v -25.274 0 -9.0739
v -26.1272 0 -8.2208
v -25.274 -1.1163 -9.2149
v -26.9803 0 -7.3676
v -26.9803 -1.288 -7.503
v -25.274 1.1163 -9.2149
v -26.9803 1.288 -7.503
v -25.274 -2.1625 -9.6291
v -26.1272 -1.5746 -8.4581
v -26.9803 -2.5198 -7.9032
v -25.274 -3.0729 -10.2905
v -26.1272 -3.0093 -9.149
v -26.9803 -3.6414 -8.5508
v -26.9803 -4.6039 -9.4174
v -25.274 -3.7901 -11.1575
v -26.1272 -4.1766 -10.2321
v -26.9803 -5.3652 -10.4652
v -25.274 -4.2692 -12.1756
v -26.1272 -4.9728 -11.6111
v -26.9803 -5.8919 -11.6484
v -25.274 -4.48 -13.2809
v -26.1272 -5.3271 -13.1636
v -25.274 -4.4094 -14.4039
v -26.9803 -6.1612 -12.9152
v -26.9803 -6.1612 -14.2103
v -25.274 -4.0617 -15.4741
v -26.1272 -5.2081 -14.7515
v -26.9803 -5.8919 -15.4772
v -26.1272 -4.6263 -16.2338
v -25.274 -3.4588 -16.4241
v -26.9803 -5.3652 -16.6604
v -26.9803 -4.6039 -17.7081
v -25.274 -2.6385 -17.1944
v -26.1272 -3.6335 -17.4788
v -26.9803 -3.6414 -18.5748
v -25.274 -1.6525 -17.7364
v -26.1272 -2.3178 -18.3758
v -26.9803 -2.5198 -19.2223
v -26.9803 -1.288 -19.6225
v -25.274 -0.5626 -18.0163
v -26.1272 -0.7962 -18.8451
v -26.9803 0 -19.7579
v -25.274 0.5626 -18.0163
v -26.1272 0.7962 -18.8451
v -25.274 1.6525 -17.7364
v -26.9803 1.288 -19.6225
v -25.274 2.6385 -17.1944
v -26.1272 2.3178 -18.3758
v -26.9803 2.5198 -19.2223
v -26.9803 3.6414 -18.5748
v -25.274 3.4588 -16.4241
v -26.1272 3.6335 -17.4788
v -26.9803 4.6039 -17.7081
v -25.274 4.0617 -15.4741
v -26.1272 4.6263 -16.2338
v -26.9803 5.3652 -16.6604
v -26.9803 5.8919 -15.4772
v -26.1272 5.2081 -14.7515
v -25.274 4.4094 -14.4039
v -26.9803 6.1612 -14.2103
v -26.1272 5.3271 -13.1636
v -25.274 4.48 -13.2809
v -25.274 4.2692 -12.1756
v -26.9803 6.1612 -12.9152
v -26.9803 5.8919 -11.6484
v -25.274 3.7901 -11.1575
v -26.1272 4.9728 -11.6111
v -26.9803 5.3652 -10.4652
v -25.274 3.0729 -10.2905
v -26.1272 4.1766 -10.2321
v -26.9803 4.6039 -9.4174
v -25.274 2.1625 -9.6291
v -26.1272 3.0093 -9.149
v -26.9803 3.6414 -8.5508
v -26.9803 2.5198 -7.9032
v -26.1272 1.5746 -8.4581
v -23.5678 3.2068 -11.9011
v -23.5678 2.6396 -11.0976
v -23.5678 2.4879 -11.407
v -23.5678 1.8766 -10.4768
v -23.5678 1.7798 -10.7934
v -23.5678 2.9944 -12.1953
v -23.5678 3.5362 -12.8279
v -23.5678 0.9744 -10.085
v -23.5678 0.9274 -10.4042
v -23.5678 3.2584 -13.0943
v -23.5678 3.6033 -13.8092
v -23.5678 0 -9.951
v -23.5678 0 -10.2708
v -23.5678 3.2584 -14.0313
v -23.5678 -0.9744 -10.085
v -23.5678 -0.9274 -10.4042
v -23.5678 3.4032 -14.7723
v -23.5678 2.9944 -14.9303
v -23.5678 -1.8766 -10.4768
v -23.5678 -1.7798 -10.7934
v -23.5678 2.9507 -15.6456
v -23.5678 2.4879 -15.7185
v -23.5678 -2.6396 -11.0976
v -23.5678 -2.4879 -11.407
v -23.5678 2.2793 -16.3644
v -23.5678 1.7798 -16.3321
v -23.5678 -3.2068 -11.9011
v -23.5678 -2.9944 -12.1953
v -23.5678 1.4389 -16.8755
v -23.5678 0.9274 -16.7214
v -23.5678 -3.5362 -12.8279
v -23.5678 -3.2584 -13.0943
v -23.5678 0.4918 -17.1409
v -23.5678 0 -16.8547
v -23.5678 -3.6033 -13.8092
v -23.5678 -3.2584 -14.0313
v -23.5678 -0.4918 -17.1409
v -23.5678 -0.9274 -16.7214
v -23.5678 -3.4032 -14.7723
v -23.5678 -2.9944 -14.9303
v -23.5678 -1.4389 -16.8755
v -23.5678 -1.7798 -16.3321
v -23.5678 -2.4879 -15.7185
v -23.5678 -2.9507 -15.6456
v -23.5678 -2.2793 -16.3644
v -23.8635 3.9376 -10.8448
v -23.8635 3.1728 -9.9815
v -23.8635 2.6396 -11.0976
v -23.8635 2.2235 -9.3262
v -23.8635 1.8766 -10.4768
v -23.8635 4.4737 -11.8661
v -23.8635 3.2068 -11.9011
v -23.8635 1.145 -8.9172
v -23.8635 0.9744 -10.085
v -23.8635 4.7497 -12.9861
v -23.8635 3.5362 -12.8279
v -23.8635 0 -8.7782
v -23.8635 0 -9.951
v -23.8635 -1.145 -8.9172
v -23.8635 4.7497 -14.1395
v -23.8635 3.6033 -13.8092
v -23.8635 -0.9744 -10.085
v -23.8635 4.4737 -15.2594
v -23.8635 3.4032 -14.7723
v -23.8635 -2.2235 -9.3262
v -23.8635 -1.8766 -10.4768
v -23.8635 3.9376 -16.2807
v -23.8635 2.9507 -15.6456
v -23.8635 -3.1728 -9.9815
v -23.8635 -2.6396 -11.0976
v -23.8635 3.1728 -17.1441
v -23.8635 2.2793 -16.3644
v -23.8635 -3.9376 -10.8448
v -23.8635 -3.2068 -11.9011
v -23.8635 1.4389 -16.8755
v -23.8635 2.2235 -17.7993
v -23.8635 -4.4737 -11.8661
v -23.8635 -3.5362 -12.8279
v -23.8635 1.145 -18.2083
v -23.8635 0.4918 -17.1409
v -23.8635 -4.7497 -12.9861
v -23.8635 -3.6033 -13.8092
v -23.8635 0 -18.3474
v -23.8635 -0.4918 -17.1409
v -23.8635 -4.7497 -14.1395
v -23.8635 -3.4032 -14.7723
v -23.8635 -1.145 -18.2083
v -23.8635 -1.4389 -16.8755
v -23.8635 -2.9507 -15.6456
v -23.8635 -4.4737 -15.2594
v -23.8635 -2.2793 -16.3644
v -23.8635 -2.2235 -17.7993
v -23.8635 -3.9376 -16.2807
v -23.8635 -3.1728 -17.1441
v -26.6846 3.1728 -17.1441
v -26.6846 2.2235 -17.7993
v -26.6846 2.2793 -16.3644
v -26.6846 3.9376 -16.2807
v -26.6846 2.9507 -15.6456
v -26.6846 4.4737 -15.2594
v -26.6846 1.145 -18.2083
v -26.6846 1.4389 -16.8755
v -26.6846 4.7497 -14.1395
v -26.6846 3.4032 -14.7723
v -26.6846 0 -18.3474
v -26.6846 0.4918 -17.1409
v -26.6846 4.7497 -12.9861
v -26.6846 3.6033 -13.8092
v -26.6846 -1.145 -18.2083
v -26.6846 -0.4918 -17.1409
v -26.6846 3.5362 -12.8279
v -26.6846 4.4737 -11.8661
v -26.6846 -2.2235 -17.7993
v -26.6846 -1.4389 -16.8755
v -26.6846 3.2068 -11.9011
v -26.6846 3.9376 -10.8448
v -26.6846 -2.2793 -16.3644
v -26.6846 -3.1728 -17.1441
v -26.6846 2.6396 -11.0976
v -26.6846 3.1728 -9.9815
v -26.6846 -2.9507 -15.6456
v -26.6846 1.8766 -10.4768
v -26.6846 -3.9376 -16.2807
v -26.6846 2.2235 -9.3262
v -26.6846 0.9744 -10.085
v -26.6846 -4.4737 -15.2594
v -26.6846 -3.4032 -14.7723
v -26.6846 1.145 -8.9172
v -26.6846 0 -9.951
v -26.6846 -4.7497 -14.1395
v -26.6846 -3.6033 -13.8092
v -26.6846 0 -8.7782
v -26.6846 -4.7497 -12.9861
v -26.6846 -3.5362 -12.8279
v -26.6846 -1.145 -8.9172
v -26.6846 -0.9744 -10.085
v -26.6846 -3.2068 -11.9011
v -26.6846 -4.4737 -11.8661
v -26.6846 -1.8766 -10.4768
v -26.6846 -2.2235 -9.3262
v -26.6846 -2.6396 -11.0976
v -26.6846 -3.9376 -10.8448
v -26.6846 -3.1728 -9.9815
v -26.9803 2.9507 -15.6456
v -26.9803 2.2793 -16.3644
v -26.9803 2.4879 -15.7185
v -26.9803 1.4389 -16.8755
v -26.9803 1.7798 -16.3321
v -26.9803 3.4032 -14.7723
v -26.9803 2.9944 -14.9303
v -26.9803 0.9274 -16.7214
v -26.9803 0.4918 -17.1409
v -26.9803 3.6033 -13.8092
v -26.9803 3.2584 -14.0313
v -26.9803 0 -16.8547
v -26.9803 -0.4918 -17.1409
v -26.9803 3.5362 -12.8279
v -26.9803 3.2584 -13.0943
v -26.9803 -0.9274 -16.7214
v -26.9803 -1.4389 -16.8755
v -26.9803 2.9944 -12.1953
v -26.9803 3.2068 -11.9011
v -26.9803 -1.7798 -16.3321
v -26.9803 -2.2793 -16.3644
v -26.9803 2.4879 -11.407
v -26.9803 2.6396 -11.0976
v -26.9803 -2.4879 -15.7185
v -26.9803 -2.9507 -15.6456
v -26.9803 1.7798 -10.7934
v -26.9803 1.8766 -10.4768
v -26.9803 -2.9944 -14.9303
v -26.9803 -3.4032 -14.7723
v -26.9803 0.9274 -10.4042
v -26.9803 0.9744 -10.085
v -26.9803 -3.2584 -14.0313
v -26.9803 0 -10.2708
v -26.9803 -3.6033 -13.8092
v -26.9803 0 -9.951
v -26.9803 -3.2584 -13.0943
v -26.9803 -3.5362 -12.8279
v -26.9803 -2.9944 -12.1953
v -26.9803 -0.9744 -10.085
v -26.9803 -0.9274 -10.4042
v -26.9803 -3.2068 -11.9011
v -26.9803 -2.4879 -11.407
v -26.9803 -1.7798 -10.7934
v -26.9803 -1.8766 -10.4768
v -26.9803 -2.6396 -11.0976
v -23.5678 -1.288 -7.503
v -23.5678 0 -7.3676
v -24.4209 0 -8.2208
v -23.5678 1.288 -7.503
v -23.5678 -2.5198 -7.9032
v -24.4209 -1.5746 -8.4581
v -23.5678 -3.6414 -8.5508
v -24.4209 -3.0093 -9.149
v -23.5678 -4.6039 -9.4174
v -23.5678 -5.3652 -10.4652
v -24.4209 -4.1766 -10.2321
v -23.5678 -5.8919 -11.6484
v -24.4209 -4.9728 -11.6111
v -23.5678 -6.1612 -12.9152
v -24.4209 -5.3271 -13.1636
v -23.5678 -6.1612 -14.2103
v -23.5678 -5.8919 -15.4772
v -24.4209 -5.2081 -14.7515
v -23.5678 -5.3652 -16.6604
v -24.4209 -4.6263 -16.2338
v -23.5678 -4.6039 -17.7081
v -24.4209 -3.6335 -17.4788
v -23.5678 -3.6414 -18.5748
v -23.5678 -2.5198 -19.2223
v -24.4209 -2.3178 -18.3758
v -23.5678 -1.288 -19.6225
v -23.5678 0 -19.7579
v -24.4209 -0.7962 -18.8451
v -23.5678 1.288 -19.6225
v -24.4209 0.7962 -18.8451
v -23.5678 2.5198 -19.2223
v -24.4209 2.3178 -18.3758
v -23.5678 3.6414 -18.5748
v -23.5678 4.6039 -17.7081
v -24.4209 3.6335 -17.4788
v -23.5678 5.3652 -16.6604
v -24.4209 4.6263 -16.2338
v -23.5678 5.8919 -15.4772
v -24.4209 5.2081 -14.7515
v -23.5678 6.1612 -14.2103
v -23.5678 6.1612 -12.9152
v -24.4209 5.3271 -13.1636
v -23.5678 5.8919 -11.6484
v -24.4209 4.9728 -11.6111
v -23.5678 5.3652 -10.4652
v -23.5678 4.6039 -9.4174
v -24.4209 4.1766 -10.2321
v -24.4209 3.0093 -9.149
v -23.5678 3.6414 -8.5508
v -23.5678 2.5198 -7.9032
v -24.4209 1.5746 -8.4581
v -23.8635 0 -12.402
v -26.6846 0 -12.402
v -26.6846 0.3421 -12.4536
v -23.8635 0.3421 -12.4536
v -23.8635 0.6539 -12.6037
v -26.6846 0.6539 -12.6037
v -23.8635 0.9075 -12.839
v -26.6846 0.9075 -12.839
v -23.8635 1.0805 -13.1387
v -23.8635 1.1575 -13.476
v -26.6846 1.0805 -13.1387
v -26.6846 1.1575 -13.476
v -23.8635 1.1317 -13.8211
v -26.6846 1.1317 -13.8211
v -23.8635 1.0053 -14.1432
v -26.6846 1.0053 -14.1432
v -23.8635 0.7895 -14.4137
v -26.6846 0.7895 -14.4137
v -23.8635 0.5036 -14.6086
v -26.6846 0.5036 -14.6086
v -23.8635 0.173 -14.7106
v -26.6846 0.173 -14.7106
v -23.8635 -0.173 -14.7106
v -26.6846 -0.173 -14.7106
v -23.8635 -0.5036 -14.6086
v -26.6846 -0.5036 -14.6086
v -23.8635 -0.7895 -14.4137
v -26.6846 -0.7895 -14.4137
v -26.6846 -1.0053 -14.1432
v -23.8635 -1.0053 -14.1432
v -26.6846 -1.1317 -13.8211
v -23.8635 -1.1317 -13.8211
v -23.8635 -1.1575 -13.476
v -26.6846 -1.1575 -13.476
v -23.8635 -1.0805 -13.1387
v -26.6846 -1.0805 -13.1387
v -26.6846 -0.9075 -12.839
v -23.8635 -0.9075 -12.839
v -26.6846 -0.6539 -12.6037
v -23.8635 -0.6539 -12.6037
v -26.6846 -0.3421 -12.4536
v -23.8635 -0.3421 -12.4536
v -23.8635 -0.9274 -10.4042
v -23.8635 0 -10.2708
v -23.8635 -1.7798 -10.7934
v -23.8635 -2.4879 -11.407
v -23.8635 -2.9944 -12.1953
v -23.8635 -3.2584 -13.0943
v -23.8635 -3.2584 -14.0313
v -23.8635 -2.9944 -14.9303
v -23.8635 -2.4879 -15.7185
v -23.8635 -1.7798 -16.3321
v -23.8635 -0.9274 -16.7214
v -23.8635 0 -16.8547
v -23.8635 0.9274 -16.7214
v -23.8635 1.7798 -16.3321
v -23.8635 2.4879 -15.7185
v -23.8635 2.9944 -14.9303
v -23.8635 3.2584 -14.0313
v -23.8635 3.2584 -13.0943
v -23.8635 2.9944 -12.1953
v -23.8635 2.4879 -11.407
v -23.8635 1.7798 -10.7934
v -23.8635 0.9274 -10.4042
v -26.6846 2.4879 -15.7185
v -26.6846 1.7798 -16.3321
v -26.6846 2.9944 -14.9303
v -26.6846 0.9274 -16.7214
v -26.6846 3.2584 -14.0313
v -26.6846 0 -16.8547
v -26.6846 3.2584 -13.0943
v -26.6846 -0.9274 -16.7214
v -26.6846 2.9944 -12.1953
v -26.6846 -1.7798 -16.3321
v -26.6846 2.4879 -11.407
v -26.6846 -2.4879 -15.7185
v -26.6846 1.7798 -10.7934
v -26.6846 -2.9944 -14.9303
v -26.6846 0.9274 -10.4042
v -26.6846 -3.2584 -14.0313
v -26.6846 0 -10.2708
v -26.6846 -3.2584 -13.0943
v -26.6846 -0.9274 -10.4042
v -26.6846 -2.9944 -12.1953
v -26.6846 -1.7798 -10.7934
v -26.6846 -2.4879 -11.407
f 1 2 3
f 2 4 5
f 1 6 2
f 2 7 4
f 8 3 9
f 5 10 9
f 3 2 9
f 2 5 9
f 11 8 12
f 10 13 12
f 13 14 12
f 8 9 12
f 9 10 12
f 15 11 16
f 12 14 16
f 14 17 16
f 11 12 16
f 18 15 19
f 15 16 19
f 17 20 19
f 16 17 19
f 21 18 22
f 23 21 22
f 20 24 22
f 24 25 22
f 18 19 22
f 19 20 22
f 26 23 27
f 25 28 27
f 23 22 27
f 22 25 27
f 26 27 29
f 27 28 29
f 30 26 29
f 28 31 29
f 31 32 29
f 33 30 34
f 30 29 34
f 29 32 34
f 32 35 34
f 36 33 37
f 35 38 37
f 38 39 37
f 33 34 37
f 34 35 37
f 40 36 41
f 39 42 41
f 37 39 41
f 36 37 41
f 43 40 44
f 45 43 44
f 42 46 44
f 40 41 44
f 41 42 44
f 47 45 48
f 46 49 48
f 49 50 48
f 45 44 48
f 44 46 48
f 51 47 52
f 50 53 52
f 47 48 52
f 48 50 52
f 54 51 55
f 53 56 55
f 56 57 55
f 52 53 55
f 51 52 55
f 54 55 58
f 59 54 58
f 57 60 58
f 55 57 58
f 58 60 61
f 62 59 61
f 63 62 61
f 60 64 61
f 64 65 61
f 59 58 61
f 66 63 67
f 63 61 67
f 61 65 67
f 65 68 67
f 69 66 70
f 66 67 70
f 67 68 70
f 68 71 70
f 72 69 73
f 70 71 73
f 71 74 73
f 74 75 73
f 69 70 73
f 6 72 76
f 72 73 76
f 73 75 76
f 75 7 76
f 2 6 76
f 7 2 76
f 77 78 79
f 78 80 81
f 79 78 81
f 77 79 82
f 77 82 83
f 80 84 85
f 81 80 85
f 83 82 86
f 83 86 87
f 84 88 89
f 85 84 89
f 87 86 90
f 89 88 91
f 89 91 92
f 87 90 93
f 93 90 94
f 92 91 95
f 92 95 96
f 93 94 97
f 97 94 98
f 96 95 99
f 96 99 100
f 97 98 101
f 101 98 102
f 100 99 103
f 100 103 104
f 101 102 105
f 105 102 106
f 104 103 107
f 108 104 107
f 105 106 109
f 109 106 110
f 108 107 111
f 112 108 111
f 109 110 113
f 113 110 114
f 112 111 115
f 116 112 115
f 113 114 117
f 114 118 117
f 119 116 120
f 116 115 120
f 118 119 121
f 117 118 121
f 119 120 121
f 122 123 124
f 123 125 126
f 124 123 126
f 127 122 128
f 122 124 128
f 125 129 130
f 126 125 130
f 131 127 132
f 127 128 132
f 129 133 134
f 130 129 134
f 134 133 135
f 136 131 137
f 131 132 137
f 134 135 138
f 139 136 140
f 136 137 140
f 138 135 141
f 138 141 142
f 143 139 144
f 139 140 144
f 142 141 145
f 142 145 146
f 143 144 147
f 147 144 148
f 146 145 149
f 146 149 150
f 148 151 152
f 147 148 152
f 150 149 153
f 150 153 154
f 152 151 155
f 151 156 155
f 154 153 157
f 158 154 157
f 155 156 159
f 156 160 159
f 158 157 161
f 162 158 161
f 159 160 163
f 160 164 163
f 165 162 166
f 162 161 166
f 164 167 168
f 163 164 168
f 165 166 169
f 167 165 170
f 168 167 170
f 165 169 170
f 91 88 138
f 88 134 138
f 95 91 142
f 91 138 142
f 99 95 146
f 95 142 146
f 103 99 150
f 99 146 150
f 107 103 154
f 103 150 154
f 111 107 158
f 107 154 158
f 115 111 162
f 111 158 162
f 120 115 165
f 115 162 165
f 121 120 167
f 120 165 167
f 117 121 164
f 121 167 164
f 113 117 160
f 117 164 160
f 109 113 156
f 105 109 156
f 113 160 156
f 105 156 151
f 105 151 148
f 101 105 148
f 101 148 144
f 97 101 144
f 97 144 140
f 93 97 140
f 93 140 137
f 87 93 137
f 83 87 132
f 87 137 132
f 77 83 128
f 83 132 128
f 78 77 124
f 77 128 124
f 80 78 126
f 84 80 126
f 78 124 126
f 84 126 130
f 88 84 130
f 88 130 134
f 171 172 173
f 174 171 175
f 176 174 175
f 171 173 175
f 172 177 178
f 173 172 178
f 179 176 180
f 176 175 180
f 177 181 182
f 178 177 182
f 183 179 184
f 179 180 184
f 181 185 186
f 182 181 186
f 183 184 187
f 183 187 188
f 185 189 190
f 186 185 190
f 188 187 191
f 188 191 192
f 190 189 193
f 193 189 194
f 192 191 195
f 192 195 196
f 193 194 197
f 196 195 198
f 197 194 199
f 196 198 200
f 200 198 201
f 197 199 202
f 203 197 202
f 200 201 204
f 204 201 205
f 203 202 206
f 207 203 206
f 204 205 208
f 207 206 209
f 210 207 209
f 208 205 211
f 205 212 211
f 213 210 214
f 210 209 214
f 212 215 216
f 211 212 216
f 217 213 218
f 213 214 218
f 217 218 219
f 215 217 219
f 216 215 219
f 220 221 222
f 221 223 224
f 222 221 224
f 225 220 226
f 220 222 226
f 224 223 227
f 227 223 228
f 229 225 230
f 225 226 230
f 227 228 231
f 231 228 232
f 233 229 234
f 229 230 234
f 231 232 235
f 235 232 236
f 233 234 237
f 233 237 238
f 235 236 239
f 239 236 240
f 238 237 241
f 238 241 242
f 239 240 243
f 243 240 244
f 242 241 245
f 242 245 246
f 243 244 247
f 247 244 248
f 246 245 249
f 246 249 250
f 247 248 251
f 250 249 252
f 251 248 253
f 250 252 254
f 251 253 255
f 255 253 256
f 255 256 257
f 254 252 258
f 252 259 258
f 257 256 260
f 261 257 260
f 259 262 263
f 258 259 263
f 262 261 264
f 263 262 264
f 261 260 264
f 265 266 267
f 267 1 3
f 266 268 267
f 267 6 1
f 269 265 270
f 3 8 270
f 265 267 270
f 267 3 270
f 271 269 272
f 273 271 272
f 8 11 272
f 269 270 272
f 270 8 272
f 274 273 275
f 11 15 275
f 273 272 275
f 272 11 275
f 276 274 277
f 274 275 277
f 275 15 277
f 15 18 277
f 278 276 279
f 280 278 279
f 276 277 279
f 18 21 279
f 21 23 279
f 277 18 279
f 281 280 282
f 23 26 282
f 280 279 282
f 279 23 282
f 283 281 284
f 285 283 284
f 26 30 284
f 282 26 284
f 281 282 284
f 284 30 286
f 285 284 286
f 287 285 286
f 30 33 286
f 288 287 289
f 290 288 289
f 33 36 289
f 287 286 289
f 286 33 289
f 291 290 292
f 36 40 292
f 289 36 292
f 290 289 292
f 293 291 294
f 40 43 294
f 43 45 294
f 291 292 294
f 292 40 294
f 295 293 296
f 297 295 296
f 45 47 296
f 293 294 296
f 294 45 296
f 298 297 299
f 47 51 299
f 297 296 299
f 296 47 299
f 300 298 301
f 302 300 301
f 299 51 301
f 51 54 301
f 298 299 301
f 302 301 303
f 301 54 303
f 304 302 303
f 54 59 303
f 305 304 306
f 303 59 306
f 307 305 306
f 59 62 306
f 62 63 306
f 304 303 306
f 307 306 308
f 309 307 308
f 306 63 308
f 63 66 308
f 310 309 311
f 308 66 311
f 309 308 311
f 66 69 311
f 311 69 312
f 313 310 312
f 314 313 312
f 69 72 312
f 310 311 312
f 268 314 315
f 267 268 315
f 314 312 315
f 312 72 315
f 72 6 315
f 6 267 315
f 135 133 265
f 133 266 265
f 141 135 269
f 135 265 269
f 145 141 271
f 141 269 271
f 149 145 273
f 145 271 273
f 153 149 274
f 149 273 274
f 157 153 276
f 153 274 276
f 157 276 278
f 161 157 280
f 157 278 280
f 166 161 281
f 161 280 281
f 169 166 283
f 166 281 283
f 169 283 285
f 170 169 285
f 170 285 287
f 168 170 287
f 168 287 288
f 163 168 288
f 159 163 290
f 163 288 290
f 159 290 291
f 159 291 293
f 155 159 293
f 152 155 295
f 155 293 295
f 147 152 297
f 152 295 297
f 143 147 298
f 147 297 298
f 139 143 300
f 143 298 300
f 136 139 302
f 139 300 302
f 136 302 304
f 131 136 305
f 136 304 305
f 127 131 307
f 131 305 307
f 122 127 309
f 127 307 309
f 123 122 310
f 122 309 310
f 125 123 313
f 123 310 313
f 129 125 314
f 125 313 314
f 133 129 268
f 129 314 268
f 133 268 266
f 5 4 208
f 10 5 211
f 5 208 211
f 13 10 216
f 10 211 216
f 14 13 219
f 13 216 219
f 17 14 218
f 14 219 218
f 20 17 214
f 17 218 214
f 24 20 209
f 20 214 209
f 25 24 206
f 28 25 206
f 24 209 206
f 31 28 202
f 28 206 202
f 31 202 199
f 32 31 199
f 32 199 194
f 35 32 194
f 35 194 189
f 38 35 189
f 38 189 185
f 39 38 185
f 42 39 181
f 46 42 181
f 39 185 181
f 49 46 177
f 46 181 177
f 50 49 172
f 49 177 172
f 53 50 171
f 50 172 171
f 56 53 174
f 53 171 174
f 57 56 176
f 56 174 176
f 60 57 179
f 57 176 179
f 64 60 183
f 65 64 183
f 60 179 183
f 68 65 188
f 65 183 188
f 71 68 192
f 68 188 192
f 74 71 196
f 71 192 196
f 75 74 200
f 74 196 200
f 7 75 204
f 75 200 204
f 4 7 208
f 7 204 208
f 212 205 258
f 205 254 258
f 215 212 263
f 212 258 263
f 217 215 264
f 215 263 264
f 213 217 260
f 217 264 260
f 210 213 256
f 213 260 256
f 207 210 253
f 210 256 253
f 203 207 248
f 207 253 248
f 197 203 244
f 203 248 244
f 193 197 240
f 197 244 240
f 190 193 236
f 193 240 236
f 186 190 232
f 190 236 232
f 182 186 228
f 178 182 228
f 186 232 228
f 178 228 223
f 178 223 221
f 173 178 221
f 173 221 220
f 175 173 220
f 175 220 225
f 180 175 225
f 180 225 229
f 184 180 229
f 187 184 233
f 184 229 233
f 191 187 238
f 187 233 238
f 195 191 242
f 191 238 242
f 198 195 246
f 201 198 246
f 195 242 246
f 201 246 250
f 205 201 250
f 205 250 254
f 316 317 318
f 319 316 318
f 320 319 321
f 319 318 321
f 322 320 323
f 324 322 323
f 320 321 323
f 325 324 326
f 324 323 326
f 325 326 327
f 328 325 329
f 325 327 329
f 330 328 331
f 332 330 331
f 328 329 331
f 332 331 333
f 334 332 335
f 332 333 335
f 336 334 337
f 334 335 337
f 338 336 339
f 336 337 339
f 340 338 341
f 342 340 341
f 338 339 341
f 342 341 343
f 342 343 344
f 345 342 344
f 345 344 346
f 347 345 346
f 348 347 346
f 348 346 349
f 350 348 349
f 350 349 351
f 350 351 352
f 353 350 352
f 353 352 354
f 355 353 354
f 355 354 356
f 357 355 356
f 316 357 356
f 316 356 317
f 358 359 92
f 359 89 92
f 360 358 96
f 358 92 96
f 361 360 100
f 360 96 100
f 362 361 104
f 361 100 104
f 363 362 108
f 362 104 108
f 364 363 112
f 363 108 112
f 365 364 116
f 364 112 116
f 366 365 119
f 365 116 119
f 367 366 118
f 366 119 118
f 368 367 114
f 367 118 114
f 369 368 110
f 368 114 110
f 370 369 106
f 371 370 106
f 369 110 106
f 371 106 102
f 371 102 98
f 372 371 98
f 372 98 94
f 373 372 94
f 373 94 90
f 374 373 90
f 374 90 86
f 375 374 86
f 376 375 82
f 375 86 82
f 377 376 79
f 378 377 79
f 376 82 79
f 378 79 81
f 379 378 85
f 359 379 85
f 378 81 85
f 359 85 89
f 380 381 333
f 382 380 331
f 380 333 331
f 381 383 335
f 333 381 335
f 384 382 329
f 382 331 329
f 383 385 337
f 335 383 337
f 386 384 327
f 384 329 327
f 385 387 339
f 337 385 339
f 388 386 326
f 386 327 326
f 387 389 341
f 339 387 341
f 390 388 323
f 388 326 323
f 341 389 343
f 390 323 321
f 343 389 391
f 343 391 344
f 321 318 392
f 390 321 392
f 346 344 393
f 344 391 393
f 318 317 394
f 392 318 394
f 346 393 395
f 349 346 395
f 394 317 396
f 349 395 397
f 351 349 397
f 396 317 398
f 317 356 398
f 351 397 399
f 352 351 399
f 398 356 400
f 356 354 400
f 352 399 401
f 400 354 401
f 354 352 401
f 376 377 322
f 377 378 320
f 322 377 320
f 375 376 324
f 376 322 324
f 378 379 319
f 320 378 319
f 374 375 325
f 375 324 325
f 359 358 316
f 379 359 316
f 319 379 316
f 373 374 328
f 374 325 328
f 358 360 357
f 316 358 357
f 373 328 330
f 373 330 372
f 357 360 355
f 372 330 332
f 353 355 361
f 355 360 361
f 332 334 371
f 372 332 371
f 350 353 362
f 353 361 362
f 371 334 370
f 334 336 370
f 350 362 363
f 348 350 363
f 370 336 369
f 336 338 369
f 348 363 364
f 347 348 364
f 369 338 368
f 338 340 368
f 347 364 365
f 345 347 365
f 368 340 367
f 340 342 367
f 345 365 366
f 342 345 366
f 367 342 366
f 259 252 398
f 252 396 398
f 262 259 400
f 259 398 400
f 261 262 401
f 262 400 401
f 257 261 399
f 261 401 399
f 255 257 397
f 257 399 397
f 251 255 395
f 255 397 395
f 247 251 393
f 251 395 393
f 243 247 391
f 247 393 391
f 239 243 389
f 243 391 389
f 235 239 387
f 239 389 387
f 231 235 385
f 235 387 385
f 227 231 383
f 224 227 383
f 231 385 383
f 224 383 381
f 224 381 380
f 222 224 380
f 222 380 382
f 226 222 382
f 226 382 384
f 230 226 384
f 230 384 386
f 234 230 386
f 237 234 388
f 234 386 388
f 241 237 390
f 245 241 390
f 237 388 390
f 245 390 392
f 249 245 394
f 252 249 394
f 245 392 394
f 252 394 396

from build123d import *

# Parameters (mm, degrees)
SKETCH2_R          = 1.160779638
CUT_EXTRUDE1_DEPTH = 7.62


with BuildPart() as part:
    # Sketch1 → Revolve1 (revolve)
    with BuildSketch(Plane(origin=(0, 0, 0), x_dir=(1, 0, 0), z_dir=(0, 1, 0))):
        Polygon((-23.567795766, 7.367626397), (-25.274044429, 9.07387506), (-26.980293092, 7.367626397), (-26.684604524, 8.778186492), (-26.684604524, 9.951033697), (-26.980293092, 9.951033697), (-26.980293092, 10.270846758), (-26.684604524, 10.270846758), (-26.684604524, 13.5627756), (-23.863484334, 13.5627756), (-23.863484334, 10.270846758), (-23.567795766, 10.270846758), (-23.567795766, 9.951033697), (-23.863484334, 9.951033697), (-23.863484334, 8.778186492), align=None)
    revolve(axis=Axis((-23.863484334, 0, -13.5627756), (1, 0, 0)))

    # Sketch2 → Cut-Extrude1 (cut)
    with BuildSketch(Plane.ZY.offset(26.684604524)):
        with Locations((-13.5627756, 0)):
            Circle(SKETCH2_R)
    extrude(amount=-CUT_EXTRUDE1_DEPTH, mode=Mode.SUBTRACT)


solid = part.part
